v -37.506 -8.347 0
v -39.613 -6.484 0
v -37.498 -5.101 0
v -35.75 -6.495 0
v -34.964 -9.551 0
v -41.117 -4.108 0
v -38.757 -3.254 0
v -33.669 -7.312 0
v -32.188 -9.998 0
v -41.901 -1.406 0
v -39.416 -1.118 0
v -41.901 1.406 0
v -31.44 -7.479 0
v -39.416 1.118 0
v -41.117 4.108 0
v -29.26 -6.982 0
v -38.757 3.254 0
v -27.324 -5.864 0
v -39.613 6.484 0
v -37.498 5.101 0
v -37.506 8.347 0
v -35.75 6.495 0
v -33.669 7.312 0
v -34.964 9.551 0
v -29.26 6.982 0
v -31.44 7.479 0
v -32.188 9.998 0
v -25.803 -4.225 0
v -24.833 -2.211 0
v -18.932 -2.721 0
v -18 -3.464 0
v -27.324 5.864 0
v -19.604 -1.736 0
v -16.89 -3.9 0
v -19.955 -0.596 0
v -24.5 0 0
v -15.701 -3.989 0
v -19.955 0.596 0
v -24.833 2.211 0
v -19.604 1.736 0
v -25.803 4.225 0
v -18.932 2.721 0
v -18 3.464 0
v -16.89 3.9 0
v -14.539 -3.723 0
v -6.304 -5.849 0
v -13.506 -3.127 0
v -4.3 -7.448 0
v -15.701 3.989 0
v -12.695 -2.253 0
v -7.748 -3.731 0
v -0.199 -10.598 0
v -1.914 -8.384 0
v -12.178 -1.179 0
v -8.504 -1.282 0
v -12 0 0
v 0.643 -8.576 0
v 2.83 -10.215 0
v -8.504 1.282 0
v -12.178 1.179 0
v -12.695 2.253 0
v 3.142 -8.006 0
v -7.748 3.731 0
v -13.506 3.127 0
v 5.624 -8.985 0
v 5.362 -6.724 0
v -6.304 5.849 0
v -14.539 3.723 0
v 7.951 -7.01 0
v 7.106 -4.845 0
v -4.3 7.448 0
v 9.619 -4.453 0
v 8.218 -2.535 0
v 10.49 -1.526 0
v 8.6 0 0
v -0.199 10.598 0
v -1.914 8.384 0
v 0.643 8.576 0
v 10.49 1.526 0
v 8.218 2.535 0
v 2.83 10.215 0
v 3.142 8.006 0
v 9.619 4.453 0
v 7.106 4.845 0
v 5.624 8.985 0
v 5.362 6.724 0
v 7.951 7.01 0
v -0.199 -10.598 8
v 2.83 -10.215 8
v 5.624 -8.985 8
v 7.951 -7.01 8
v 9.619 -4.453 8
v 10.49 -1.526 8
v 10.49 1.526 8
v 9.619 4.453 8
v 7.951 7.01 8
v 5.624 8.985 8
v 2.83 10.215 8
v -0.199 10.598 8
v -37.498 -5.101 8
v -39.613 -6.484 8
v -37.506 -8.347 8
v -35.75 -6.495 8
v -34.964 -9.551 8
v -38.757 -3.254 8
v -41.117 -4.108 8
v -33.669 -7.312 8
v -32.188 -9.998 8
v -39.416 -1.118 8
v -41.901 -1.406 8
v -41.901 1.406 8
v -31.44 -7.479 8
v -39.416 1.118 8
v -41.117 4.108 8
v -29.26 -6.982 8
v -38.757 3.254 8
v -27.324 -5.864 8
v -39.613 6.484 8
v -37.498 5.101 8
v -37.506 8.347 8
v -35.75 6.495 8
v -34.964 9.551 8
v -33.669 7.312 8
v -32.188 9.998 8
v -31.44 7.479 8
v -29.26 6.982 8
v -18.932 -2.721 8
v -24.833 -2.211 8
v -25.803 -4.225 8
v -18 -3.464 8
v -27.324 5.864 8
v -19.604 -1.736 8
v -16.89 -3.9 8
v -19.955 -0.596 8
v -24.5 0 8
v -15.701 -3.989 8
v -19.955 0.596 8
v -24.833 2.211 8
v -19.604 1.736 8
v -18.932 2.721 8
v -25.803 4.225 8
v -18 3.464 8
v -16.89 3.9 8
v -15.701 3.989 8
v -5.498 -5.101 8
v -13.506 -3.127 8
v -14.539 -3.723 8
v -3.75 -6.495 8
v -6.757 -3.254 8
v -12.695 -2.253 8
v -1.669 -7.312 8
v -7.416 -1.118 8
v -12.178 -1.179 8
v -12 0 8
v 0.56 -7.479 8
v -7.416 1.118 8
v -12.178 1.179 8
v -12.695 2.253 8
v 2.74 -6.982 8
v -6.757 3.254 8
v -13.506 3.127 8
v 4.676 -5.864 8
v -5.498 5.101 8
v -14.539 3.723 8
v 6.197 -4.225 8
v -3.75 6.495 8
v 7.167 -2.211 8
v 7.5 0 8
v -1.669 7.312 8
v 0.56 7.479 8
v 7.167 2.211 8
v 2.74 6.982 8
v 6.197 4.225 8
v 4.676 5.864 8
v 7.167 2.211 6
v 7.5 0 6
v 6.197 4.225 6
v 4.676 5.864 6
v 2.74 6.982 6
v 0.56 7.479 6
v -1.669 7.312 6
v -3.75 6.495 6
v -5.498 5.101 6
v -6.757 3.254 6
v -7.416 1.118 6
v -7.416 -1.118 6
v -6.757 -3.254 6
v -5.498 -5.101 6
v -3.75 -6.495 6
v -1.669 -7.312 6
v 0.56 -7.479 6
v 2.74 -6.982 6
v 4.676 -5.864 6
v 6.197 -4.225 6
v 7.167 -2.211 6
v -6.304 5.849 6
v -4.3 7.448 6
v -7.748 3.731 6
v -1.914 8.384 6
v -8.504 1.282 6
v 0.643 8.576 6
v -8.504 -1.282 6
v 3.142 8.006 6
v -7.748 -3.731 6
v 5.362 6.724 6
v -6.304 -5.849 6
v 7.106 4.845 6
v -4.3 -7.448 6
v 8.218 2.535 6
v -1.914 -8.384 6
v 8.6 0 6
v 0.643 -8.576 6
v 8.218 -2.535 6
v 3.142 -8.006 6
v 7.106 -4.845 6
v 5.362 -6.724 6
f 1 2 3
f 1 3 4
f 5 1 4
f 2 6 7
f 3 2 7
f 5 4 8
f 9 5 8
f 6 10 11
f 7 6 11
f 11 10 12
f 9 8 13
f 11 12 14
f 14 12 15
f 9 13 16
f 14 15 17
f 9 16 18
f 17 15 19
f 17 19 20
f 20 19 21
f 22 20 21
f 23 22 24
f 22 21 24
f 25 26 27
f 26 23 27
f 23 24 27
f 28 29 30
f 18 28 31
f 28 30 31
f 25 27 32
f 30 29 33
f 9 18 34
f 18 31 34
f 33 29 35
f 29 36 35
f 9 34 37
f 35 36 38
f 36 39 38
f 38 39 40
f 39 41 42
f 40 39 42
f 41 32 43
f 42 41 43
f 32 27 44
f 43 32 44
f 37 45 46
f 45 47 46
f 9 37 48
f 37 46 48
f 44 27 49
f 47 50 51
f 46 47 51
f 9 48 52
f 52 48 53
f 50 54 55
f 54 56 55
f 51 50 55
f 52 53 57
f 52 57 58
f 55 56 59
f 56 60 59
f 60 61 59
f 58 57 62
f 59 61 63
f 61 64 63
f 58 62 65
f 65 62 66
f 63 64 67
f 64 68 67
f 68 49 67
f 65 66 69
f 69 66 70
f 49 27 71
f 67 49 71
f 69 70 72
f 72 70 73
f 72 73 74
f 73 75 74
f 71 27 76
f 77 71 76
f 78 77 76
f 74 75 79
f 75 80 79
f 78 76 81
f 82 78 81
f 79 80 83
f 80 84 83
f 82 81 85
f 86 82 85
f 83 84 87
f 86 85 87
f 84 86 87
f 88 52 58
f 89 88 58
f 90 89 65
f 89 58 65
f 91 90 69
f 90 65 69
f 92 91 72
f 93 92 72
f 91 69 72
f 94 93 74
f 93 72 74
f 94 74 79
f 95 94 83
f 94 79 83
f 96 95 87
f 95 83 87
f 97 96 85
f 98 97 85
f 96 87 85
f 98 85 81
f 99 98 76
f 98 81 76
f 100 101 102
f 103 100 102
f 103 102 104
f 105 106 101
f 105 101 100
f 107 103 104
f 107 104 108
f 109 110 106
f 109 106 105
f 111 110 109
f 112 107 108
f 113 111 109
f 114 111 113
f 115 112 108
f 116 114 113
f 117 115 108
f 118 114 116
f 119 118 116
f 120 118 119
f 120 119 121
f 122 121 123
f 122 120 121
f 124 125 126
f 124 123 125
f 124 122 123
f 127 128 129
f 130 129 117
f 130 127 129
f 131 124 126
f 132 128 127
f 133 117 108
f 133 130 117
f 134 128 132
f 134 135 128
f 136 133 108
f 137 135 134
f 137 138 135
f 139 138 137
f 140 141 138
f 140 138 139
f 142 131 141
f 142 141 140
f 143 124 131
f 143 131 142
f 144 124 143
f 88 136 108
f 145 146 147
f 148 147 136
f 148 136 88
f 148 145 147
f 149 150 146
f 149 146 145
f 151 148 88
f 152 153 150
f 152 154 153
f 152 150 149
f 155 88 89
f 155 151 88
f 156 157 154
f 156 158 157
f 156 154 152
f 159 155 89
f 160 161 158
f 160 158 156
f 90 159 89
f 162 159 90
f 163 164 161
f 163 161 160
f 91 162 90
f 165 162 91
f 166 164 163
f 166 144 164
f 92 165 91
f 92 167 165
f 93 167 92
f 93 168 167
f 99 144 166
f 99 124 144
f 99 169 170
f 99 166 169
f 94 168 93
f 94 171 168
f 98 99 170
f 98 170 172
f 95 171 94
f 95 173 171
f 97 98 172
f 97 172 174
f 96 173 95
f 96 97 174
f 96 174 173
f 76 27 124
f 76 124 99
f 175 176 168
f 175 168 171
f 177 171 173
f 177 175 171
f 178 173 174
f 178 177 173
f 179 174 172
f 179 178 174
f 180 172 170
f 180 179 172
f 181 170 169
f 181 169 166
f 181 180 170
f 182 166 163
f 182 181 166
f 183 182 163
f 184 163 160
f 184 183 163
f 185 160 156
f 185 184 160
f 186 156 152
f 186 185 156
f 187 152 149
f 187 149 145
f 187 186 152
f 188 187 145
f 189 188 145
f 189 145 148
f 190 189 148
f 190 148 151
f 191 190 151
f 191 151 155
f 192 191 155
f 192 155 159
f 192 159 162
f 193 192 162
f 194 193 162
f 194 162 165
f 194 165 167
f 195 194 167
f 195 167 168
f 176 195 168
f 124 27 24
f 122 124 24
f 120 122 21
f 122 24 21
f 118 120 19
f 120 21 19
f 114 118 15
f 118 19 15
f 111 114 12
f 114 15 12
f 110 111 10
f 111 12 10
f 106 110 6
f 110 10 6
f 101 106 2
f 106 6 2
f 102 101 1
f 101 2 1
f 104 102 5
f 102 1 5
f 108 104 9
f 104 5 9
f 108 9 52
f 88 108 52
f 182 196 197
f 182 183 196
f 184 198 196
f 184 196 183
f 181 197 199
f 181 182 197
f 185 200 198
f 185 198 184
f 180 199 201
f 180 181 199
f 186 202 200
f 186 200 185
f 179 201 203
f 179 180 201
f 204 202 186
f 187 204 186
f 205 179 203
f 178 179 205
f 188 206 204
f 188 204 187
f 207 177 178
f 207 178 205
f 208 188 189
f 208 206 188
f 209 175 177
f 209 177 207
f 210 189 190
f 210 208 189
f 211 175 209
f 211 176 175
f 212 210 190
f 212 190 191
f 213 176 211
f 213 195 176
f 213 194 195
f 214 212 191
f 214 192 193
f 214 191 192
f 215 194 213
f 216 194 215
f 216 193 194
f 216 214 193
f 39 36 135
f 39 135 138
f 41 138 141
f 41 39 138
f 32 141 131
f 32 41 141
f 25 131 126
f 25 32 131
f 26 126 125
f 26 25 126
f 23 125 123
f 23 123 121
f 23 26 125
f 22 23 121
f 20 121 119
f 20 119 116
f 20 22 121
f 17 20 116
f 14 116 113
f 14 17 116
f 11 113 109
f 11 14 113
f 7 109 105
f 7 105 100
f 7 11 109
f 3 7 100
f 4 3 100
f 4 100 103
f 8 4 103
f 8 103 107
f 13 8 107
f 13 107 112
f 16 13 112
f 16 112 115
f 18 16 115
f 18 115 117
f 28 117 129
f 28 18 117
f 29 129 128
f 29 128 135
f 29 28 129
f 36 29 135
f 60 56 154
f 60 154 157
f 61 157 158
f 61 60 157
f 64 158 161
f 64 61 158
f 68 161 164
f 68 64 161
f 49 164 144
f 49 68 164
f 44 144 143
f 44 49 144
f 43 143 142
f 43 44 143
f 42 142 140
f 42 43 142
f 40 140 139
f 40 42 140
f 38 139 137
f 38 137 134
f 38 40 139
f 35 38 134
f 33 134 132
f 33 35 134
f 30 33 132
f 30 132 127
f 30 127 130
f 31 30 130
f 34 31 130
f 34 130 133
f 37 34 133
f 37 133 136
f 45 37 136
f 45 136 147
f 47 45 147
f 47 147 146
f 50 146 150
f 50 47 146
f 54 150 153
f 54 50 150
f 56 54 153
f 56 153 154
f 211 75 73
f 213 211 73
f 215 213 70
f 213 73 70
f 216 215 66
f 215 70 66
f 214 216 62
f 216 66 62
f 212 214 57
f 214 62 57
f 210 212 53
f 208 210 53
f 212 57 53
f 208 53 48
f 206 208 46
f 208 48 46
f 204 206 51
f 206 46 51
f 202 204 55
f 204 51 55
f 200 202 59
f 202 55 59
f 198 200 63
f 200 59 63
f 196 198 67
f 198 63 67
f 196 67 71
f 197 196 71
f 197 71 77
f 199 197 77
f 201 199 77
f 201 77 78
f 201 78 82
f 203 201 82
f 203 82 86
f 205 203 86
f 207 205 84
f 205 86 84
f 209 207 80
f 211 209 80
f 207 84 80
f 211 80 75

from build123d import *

# Parameters (mm, degrees)
SKETCH_R        = 7.5
SKETCH_R_2      = 4
PAD_DEPTH       = 8
SKETCH001_R     = 8.6
POCKET_DEPTH    = 6
POCKET001_DEPTH = 8.001


with BuildPart() as part:
    # Sketch → Pad (new body)
    with BuildSketch(Plane.XY):
        with BuildLine():
            ThreePointArc((-32.1875, 9.998242), (-42, 0), (-32.1875, -9.998242))
            Line((-32.1875, -9.998242), (-0.19875, -10.598137))
            ThreePointArc((-0.19875, -10.598137), (10.6, 0), (-0.19875, 10.598137))
            Line((-32.1875, 9.998242), (-0.19875, 10.598137))
        make_face()
        with Locations((-32, 0)):
            Circle(SKETCH_R, mode=Mode.SUBTRACT)
        Circle(SKETCH_R, mode=Mode.SUBTRACT)
        with Locations((-16, 0)):
            Circle(SKETCH_R_2, mode=Mode.SUBTRACT)
    extrude(amount=PAD_DEPTH)

    # Sketch001 → Pocket (cut)
    with BuildSketch(Plane(origin=(0, 0, 0), x_dir=(1, 0, 0), z_dir=(0, 0, -1))):
        Circle(SKETCH001_R)
    extrude(amount=-POCKET_DEPTH, mode=Mode.SUBTRACT)

    # Sketch002 → Pocket001 (cut, through all)
    with BuildSketch(Plane(origin=(0, 0, 0), x_dir=(1, 0, 0), z_dir=(0, 0, -1))):
        Polygon((-34.829016, 4.9), (-37.658033, 0), (-34.829016, -4.9), (-29.170984, -4.9), (-26.341967, 0), (-29.170984, 4.9), align=None)
    extrude(amount=-POCKET001_DEPTH, mode=Mode.SUBTRACT)


solid = part.part
